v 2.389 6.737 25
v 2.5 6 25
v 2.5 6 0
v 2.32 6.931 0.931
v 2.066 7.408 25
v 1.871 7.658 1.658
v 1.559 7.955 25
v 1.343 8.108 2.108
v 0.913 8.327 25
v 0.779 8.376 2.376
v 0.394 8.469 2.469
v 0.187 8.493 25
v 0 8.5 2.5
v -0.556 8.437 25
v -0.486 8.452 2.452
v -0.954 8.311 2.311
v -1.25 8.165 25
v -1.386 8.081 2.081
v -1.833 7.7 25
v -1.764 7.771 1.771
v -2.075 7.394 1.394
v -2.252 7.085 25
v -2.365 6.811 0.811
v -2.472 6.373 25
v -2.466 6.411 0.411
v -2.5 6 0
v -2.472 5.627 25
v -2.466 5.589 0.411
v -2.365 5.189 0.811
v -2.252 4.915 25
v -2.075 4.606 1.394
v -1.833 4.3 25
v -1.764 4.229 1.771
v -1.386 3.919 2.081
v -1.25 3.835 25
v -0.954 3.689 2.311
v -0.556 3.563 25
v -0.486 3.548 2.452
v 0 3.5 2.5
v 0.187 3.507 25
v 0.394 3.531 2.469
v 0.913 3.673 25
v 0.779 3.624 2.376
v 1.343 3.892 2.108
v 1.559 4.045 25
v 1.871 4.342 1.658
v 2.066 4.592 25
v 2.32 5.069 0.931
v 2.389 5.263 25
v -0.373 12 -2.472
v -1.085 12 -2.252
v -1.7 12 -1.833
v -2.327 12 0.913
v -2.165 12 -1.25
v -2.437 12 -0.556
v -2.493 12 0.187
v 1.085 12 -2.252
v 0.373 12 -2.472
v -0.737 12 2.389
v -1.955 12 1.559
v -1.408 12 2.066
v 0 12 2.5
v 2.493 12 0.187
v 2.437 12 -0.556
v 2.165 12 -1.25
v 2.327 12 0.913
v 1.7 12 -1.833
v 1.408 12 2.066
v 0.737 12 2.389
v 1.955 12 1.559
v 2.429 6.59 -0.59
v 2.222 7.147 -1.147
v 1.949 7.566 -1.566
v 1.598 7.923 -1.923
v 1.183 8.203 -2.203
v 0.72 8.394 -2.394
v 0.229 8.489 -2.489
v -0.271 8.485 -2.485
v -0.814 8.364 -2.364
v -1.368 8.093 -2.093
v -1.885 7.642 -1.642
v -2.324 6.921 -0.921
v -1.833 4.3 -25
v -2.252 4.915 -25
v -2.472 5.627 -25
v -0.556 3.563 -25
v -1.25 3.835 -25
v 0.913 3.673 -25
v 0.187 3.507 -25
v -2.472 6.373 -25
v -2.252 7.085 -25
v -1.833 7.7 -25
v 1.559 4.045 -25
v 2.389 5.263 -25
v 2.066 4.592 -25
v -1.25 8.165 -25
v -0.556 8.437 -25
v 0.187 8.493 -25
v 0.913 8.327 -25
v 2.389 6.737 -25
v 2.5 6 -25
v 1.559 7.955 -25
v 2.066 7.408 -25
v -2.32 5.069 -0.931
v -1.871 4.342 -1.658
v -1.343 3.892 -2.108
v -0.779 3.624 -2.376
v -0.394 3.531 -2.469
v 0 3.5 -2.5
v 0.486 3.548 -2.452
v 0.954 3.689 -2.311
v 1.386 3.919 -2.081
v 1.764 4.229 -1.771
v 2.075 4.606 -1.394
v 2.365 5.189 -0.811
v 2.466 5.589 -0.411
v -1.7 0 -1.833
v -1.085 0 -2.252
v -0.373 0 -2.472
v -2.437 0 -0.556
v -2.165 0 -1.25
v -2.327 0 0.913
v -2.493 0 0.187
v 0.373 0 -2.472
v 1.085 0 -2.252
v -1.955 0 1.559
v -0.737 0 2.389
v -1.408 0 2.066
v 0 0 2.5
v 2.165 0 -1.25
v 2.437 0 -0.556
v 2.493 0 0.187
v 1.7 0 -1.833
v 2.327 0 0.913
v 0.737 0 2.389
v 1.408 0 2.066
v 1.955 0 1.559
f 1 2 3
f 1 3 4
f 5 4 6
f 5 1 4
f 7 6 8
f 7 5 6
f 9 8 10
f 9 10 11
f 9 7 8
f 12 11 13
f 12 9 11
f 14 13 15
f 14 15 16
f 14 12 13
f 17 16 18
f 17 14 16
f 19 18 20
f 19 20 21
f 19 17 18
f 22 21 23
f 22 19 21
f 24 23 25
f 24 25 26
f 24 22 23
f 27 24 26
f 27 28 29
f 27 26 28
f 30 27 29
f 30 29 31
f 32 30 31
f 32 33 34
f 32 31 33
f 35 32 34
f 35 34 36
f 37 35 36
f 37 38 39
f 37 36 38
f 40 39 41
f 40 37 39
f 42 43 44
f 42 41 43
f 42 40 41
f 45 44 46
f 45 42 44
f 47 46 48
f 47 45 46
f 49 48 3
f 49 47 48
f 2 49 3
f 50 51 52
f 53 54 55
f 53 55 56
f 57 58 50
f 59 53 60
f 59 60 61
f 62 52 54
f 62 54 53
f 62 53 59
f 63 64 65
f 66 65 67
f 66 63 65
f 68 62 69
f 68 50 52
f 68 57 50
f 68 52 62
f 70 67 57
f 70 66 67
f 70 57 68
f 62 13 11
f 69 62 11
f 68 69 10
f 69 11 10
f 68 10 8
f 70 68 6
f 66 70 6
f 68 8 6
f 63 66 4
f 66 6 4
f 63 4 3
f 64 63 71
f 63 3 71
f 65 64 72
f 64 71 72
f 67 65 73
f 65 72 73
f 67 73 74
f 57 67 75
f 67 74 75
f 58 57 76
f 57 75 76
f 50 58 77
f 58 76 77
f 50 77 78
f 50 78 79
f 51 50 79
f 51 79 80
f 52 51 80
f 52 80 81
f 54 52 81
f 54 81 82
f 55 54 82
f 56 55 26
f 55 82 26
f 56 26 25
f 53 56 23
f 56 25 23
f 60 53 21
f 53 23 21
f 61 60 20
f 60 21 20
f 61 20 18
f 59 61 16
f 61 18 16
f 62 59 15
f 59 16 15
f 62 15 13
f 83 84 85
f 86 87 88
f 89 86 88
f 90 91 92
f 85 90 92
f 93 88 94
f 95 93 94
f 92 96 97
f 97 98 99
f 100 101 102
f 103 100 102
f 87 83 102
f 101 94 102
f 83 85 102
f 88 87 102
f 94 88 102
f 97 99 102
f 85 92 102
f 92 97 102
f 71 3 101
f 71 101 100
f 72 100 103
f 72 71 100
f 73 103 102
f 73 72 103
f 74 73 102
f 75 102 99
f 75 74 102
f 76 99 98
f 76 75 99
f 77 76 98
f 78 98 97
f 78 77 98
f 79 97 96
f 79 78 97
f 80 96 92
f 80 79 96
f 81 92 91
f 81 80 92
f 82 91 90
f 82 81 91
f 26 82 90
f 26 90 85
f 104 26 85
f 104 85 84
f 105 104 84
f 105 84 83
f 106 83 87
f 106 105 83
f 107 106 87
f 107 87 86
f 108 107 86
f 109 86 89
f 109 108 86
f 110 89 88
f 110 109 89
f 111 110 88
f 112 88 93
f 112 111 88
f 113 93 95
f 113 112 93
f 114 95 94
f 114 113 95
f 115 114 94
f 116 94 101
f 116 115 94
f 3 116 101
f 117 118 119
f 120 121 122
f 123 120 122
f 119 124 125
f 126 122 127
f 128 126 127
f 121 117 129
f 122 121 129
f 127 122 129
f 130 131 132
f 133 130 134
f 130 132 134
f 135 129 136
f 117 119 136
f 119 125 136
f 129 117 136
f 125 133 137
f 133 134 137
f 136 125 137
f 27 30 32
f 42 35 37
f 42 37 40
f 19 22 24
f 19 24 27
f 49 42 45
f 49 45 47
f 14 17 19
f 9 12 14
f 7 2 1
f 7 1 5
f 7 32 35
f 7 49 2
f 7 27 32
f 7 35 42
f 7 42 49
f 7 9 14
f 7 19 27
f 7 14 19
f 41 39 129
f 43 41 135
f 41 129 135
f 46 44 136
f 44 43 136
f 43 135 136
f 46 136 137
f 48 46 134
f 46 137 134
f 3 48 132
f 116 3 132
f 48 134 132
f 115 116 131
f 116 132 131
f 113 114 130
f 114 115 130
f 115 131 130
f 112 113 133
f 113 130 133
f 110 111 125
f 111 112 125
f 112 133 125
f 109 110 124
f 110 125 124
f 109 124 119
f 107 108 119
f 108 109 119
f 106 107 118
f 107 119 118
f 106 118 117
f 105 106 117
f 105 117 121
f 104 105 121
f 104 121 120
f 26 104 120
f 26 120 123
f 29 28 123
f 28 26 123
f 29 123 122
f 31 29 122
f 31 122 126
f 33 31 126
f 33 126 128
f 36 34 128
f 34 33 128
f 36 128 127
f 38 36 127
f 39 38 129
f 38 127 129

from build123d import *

# Parameters (mm, degrees)
SKETCH1_R           = 2.5
BOSS_EXTRUDE1_DEPTH = 12
SKETCH2_R           = 2.5
BOSS_EXTRUDE2_DEPTH = 25


with BuildPart() as part:
    # Sketch1 → Boss-Extrude1 (new body)
    with BuildSketch(Plane(origin=(0, 0, 0), x_dir=(1, 0, 0), z_dir=(0, 1, 0))):
        with Locations(Location((0, 0, 0), (0, 0, 270))):
            Circle(SKETCH1_R)
    extrude(amount=BOSS_EXTRUDE1_DEPTH)

    # Sketch2 → Boss-Extrude2 (add, symmetric)
    with BuildSketch(Plane.XY):
        with Locations((0, 6)):
            Circle(SKETCH2_R)
    extrude(amount=BOSS_EXTRUDE2_DEPTH, both=True)


solid = part.part
